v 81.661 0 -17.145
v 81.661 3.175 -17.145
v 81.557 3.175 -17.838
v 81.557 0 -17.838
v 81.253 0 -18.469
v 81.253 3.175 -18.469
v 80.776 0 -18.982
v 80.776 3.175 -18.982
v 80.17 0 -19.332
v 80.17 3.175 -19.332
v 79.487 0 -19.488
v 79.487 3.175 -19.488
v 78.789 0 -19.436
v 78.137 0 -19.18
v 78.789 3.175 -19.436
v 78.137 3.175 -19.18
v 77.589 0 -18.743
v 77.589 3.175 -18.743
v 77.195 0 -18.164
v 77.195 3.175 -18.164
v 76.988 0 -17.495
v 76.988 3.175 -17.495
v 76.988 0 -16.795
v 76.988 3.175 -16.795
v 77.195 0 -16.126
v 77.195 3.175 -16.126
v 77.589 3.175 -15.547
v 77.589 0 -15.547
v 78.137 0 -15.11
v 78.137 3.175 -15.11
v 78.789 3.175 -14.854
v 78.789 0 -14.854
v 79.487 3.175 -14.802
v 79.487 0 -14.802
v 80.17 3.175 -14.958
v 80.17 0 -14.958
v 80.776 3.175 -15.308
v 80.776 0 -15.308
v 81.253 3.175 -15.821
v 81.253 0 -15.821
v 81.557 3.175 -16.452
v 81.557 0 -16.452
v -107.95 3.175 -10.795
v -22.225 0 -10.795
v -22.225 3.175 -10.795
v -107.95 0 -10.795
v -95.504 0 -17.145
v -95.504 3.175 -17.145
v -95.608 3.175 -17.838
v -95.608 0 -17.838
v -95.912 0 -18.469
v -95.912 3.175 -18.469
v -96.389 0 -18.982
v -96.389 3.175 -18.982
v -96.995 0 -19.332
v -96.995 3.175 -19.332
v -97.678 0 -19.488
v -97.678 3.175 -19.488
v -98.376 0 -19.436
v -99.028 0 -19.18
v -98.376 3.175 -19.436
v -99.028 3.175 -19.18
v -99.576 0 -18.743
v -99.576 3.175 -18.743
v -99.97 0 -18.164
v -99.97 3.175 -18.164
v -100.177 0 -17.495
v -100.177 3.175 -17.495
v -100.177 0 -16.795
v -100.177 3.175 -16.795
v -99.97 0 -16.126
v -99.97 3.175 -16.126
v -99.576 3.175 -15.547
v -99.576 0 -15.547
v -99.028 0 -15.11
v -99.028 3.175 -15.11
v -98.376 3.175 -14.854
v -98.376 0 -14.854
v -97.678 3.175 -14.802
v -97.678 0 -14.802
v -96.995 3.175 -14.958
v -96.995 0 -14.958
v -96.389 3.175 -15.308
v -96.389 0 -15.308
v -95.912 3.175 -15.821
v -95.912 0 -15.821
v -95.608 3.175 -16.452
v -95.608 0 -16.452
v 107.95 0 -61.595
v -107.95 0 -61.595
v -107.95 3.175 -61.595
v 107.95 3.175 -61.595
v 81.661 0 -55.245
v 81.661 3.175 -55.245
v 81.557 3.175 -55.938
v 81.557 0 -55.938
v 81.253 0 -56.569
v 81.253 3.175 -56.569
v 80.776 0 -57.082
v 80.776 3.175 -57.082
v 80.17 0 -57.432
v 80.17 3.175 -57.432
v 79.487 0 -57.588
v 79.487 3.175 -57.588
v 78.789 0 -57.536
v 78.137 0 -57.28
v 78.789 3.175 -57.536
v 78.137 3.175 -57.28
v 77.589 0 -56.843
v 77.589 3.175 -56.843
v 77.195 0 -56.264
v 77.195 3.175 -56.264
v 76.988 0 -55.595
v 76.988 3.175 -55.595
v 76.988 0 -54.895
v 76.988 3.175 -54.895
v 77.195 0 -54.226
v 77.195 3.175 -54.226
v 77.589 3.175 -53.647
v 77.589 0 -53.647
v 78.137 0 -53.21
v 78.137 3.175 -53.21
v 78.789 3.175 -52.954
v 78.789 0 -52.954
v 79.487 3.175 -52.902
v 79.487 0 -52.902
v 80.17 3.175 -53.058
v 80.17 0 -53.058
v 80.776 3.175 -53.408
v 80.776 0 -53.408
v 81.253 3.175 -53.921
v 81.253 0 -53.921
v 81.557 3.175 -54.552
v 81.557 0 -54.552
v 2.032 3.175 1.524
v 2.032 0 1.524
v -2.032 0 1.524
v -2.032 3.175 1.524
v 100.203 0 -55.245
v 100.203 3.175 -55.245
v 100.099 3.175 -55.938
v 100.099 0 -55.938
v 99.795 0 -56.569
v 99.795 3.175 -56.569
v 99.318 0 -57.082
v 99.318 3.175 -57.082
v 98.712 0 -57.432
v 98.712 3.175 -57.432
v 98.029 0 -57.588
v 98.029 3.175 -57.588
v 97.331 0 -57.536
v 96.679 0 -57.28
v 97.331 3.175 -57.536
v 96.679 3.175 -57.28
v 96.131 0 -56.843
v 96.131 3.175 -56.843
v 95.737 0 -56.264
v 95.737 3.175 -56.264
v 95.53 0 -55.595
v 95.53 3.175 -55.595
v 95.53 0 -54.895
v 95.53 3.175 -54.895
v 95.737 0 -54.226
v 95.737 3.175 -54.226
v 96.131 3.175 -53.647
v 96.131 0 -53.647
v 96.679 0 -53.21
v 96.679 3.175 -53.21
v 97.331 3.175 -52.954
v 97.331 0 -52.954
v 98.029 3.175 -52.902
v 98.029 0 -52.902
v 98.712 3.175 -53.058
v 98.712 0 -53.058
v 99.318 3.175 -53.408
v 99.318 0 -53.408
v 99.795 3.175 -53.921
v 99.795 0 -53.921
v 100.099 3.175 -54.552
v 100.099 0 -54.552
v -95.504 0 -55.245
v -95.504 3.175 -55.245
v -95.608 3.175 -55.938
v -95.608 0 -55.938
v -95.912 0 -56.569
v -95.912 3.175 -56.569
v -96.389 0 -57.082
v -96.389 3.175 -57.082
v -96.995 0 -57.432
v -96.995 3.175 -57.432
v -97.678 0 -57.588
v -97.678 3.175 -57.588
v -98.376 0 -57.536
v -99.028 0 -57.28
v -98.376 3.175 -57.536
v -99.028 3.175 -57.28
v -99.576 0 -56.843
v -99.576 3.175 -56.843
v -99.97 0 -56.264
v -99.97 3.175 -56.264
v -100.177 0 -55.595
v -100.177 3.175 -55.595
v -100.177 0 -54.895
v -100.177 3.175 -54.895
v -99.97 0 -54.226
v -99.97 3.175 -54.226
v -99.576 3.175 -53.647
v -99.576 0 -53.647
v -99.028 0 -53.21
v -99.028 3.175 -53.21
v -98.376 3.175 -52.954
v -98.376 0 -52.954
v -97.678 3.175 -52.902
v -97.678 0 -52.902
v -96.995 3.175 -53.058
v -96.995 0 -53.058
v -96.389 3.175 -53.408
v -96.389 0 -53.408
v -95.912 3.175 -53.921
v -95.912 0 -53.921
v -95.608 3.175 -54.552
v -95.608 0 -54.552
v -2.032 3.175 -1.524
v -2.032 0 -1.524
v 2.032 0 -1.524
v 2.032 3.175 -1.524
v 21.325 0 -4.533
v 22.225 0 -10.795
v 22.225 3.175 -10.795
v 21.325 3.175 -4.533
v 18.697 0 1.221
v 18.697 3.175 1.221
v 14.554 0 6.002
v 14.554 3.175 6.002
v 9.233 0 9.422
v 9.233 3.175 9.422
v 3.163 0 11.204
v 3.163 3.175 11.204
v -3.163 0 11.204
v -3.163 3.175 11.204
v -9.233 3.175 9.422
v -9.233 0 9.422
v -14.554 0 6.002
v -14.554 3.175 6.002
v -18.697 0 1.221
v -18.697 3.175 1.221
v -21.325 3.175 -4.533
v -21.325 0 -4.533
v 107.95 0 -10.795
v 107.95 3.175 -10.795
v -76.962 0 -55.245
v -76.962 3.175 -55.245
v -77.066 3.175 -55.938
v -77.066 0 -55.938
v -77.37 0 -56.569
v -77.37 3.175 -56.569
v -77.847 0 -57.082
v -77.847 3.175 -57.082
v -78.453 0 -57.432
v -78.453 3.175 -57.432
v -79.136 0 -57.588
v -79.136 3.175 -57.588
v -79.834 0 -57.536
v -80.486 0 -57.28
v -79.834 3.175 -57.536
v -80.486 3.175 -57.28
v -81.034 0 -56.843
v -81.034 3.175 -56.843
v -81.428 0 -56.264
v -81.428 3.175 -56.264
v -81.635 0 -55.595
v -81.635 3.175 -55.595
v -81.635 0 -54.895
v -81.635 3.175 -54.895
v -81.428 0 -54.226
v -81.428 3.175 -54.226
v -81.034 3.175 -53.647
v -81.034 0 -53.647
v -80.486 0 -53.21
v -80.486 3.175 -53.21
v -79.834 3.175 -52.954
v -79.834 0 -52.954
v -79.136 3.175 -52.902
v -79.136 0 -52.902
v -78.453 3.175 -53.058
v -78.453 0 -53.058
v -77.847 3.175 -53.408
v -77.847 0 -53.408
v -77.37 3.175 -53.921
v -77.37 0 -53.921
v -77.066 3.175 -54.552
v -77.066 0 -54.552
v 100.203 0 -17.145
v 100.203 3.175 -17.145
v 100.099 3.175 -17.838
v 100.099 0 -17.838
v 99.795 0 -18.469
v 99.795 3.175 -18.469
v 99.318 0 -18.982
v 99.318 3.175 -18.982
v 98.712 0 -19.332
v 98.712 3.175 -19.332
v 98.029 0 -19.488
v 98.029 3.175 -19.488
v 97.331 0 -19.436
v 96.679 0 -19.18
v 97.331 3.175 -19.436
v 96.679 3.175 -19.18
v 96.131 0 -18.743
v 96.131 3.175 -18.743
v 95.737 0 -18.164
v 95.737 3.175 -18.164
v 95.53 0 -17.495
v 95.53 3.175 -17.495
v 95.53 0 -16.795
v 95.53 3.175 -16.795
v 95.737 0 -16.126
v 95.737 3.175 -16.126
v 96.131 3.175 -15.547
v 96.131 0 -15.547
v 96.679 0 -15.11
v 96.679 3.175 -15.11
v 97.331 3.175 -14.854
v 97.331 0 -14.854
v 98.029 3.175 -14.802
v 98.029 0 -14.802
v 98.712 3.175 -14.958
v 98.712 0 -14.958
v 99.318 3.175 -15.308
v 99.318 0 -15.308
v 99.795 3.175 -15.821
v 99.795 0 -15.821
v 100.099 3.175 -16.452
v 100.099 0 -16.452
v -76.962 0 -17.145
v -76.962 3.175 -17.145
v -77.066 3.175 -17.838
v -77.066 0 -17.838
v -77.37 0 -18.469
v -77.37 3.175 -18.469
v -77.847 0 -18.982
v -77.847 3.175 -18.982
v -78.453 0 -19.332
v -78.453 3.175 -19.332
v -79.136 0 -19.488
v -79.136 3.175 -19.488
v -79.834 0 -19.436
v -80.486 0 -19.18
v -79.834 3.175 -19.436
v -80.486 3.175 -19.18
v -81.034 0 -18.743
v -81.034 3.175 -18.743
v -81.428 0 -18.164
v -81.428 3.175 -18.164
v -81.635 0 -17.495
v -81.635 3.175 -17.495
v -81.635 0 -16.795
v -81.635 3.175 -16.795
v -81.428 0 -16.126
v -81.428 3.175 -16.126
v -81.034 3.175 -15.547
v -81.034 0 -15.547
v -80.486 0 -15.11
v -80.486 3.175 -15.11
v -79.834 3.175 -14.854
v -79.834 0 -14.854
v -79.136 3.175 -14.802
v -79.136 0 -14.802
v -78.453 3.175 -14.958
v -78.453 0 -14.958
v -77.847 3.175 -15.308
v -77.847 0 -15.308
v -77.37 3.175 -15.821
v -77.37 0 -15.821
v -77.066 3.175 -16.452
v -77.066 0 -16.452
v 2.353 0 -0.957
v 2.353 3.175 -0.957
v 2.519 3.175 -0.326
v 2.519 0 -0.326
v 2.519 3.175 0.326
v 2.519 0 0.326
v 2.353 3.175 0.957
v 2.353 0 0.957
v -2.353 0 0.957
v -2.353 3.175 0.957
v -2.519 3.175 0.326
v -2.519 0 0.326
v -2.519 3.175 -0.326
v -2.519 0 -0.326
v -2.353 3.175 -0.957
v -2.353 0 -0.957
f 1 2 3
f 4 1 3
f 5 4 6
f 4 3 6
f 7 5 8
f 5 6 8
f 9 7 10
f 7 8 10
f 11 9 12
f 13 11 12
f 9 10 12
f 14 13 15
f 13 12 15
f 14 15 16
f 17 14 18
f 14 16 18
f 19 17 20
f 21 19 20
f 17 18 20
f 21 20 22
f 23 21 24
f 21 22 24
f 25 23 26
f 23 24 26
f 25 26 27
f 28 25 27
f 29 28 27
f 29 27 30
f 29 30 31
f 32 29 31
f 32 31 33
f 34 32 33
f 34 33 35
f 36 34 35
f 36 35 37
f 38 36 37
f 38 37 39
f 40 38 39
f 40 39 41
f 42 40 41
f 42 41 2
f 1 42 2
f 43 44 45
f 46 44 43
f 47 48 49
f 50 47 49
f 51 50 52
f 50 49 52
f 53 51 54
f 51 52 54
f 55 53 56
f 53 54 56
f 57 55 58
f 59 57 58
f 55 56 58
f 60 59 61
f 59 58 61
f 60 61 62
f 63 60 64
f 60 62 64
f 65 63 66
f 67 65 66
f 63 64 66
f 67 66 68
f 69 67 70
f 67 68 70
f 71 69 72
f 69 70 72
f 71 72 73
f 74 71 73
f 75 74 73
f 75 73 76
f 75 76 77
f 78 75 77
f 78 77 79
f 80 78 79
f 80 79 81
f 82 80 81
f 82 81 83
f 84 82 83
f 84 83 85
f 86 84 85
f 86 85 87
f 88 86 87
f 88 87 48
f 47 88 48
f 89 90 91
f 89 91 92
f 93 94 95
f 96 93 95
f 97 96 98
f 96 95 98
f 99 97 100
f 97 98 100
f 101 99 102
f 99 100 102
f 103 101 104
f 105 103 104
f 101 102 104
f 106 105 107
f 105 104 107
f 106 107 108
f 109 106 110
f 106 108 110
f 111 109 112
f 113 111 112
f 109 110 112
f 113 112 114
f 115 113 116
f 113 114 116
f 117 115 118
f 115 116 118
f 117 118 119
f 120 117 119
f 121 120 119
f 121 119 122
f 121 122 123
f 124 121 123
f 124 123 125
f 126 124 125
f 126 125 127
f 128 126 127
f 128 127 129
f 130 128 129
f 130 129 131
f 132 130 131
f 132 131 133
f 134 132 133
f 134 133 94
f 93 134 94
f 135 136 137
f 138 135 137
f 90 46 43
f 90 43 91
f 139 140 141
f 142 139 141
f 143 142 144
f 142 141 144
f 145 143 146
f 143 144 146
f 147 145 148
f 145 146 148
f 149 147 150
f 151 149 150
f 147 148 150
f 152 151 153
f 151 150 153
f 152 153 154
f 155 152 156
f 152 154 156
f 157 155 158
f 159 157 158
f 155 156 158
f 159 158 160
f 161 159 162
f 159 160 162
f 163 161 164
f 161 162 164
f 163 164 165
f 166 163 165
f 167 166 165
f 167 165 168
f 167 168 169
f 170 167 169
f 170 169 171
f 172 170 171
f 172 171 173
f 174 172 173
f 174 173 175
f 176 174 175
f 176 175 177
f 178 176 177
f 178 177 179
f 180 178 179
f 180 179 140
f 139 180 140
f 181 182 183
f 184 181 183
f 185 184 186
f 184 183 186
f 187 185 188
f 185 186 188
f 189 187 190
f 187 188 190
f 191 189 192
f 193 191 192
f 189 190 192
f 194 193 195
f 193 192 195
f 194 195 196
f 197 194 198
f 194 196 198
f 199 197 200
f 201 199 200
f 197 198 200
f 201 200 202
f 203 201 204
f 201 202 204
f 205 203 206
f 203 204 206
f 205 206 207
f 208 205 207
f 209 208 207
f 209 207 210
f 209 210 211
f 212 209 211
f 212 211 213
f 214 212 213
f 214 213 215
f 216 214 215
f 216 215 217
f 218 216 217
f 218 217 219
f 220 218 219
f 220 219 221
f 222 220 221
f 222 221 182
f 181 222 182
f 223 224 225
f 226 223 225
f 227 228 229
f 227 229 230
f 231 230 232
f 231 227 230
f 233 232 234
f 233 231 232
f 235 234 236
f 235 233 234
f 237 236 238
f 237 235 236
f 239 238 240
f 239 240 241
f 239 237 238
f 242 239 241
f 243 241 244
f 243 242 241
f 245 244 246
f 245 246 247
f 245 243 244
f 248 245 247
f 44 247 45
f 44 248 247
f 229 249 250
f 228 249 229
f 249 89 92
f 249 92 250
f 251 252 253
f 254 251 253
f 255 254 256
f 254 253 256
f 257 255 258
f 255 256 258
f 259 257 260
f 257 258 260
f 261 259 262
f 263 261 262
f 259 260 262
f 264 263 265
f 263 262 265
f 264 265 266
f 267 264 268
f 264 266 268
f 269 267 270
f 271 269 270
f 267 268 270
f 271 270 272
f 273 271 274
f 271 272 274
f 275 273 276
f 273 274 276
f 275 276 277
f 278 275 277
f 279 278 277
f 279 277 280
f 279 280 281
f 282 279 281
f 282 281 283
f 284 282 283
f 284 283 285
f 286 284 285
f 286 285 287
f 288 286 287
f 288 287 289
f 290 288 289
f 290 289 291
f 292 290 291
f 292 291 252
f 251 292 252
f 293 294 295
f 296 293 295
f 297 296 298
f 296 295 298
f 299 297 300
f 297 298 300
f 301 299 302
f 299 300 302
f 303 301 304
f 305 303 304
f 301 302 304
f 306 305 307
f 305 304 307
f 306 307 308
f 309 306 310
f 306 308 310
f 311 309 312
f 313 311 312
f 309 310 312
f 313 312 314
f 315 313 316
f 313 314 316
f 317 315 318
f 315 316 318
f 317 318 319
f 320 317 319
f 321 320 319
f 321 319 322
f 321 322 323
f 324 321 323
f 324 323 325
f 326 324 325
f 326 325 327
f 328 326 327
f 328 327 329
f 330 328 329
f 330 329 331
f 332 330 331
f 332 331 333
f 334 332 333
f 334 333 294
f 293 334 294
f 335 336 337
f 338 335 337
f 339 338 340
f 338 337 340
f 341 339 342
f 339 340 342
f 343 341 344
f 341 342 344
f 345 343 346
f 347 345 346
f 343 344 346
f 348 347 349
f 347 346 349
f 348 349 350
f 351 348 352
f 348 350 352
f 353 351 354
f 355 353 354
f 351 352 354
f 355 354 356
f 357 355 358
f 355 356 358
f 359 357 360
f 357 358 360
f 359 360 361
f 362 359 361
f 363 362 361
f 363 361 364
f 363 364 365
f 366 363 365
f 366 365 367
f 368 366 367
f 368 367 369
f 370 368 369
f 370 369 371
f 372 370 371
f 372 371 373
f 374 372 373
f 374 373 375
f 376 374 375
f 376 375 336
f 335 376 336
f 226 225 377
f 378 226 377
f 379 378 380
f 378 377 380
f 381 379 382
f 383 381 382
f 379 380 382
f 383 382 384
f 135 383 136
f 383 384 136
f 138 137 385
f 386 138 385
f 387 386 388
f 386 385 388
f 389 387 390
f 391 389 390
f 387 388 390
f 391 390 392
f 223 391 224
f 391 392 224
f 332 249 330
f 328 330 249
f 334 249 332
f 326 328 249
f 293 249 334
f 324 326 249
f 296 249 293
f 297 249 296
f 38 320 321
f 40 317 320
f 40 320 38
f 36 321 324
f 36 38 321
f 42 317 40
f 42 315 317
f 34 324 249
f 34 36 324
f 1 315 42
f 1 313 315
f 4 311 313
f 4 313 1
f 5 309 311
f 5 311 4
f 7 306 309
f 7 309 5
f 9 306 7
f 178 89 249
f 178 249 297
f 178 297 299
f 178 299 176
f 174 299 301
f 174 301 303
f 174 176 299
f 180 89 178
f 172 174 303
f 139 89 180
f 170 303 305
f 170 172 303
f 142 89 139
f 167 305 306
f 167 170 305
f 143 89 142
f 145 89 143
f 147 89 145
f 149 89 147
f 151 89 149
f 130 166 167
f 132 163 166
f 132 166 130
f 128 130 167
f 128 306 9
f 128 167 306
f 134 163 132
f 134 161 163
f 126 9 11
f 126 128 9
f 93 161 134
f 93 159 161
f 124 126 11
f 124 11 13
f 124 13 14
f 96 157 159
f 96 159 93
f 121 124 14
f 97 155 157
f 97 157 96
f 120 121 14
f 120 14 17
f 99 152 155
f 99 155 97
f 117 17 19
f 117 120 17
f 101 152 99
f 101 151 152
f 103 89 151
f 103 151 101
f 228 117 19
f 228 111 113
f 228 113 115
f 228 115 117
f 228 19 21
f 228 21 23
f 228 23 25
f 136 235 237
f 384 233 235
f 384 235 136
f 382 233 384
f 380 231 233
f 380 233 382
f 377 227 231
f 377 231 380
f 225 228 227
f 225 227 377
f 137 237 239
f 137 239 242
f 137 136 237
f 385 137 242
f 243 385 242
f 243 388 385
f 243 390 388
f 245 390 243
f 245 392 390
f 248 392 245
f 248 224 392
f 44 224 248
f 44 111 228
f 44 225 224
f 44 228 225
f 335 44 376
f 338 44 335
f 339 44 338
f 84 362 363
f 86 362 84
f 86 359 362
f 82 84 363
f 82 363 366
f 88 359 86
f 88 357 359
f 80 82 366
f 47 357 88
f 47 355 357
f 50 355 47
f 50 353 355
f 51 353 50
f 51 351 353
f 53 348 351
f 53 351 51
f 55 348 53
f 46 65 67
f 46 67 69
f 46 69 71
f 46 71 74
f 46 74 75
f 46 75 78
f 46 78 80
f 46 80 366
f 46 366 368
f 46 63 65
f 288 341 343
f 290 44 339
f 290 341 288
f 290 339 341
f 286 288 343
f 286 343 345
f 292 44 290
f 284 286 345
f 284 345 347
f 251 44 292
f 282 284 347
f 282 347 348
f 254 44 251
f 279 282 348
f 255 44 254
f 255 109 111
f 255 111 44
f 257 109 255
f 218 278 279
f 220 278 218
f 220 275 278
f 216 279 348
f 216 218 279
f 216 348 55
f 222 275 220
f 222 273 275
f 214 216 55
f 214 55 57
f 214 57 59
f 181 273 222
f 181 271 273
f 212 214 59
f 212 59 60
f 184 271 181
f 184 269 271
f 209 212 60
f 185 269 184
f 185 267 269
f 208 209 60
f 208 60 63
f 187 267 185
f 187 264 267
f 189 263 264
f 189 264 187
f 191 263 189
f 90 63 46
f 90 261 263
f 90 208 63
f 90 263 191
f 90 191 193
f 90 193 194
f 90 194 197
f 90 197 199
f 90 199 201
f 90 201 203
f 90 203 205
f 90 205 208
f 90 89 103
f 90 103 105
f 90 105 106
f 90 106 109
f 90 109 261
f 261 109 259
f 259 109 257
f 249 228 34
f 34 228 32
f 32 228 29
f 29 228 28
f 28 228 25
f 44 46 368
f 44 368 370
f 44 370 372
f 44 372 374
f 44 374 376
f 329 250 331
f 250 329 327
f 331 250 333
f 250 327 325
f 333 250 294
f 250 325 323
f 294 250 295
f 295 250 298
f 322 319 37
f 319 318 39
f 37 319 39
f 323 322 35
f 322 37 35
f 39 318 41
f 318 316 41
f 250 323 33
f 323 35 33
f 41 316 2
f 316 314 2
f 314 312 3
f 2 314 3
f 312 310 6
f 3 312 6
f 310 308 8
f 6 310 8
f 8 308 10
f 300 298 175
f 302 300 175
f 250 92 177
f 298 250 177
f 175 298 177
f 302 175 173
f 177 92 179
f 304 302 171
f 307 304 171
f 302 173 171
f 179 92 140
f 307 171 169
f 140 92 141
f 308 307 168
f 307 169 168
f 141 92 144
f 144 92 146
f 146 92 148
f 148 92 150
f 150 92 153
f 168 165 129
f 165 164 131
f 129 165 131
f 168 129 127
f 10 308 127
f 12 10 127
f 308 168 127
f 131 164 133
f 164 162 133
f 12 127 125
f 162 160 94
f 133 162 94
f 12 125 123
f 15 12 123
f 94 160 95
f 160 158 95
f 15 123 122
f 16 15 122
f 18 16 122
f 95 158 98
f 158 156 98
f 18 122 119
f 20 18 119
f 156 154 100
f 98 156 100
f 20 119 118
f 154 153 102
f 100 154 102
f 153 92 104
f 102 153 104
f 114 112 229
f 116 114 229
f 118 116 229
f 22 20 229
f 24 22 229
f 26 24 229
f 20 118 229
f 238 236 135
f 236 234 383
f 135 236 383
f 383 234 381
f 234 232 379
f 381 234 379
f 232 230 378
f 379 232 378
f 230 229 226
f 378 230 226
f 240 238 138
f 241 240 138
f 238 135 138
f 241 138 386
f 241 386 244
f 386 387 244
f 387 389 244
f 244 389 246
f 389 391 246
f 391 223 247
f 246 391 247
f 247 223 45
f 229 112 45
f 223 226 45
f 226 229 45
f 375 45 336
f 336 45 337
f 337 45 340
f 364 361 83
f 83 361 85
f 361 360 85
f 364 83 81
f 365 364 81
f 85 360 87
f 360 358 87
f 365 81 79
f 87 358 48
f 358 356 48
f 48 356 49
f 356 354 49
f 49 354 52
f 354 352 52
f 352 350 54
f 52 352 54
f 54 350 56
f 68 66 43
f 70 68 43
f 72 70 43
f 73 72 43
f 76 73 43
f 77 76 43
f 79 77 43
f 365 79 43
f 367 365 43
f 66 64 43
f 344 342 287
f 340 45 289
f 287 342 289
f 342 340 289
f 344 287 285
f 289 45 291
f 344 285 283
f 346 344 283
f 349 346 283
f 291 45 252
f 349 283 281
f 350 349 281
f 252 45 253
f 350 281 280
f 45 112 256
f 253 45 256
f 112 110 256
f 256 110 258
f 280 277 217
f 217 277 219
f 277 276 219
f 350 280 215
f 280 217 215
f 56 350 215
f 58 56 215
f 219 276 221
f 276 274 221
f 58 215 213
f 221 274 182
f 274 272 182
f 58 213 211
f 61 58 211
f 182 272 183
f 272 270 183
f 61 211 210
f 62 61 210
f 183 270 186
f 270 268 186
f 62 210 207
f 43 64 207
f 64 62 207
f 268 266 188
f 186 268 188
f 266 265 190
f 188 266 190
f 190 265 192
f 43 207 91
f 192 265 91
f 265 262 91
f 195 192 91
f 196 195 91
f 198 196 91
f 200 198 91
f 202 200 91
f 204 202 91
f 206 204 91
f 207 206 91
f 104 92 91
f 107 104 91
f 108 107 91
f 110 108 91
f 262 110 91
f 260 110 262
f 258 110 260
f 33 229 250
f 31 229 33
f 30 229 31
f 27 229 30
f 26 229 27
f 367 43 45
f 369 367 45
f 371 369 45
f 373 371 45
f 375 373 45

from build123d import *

# Parameters (mm, degrees)
BOSS_EXTRUDE1_DEPTH = 3.175
SKETCH2_R           = 2.3495
CUT_EXTRUDE1_DEPTH  = 4.175


with BuildPart() as part:
    # Sketch1 → Boss-Extrude1 (new body)
    with BuildSketch(Plane(origin=(0, 0, 0), x_dir=(1, 0, 0), z_dir=(0, 1, 0))):
        with BuildLine():
            Line((-107.95, 61.595), (107.95, 61.595))
            Line((107.95, 61.595), (107.95, 10.795))
            Line((107.95, 10.795), (22.225, 10.795))
            ThreePointArc((22.225, 10.795), (0, -11.43), (-22.225, 10.795))
            Line((-22.225, 10.795), (-107.95, 10.795))
            Line((-107.95, 10.795), (-107.95, 61.595))
        make_face()
        with BuildLine():
            Line((-2.032, 1.524), (2.032, 1.524))
            ThreePointArc((2.032, 1.524), (2.54, 0), (2.032, -1.524))
            Line((2.032, -1.524), (-2.032, -1.524))
            ThreePointArc((-2.032, -1.524), (-2.54, 0), (-2.032, 1.524))
        make_face(mode=Mode.SUBTRACT)
    extrude(amount=BOSS_EXTRUDE1_DEPTH)

    # Sketch2 → Cut-Extrude1 (cut, through all)
    with BuildSketch(Plane(origin=(0, 3.175, 0), x_dir=(1, 0, 0), z_dir=(0, 1, 0))):
        with Locations((-97.8535, 55.245)):
            Circle(SKETCH2_R)
        with Locations((-97.8535, 17.145)):
            Circle(SKETCH2_R)
        with Locations((-79.3115, 17.145)):
            Circle(SKETCH2_R)
        with Locations((-79.3115, 55.245)):
            Circle(SKETCH2_R)
        with Locations((79.3115, 55.245)):
            Circle(SKETCH2_R)
        with Locations((79.3115, 17.145)):
            Circle(SKETCH2_R)
        with Locations((97.8535, 17.145)):
            Circle(SKETCH2_R)
        with Locations((97.8535, 55.245)):
            Circle(SKETCH2_R)
    extrude(amount=-CUT_EXTRUDE1_DEPTH, mode=Mode.SUBTRACT)


solid = part.part
